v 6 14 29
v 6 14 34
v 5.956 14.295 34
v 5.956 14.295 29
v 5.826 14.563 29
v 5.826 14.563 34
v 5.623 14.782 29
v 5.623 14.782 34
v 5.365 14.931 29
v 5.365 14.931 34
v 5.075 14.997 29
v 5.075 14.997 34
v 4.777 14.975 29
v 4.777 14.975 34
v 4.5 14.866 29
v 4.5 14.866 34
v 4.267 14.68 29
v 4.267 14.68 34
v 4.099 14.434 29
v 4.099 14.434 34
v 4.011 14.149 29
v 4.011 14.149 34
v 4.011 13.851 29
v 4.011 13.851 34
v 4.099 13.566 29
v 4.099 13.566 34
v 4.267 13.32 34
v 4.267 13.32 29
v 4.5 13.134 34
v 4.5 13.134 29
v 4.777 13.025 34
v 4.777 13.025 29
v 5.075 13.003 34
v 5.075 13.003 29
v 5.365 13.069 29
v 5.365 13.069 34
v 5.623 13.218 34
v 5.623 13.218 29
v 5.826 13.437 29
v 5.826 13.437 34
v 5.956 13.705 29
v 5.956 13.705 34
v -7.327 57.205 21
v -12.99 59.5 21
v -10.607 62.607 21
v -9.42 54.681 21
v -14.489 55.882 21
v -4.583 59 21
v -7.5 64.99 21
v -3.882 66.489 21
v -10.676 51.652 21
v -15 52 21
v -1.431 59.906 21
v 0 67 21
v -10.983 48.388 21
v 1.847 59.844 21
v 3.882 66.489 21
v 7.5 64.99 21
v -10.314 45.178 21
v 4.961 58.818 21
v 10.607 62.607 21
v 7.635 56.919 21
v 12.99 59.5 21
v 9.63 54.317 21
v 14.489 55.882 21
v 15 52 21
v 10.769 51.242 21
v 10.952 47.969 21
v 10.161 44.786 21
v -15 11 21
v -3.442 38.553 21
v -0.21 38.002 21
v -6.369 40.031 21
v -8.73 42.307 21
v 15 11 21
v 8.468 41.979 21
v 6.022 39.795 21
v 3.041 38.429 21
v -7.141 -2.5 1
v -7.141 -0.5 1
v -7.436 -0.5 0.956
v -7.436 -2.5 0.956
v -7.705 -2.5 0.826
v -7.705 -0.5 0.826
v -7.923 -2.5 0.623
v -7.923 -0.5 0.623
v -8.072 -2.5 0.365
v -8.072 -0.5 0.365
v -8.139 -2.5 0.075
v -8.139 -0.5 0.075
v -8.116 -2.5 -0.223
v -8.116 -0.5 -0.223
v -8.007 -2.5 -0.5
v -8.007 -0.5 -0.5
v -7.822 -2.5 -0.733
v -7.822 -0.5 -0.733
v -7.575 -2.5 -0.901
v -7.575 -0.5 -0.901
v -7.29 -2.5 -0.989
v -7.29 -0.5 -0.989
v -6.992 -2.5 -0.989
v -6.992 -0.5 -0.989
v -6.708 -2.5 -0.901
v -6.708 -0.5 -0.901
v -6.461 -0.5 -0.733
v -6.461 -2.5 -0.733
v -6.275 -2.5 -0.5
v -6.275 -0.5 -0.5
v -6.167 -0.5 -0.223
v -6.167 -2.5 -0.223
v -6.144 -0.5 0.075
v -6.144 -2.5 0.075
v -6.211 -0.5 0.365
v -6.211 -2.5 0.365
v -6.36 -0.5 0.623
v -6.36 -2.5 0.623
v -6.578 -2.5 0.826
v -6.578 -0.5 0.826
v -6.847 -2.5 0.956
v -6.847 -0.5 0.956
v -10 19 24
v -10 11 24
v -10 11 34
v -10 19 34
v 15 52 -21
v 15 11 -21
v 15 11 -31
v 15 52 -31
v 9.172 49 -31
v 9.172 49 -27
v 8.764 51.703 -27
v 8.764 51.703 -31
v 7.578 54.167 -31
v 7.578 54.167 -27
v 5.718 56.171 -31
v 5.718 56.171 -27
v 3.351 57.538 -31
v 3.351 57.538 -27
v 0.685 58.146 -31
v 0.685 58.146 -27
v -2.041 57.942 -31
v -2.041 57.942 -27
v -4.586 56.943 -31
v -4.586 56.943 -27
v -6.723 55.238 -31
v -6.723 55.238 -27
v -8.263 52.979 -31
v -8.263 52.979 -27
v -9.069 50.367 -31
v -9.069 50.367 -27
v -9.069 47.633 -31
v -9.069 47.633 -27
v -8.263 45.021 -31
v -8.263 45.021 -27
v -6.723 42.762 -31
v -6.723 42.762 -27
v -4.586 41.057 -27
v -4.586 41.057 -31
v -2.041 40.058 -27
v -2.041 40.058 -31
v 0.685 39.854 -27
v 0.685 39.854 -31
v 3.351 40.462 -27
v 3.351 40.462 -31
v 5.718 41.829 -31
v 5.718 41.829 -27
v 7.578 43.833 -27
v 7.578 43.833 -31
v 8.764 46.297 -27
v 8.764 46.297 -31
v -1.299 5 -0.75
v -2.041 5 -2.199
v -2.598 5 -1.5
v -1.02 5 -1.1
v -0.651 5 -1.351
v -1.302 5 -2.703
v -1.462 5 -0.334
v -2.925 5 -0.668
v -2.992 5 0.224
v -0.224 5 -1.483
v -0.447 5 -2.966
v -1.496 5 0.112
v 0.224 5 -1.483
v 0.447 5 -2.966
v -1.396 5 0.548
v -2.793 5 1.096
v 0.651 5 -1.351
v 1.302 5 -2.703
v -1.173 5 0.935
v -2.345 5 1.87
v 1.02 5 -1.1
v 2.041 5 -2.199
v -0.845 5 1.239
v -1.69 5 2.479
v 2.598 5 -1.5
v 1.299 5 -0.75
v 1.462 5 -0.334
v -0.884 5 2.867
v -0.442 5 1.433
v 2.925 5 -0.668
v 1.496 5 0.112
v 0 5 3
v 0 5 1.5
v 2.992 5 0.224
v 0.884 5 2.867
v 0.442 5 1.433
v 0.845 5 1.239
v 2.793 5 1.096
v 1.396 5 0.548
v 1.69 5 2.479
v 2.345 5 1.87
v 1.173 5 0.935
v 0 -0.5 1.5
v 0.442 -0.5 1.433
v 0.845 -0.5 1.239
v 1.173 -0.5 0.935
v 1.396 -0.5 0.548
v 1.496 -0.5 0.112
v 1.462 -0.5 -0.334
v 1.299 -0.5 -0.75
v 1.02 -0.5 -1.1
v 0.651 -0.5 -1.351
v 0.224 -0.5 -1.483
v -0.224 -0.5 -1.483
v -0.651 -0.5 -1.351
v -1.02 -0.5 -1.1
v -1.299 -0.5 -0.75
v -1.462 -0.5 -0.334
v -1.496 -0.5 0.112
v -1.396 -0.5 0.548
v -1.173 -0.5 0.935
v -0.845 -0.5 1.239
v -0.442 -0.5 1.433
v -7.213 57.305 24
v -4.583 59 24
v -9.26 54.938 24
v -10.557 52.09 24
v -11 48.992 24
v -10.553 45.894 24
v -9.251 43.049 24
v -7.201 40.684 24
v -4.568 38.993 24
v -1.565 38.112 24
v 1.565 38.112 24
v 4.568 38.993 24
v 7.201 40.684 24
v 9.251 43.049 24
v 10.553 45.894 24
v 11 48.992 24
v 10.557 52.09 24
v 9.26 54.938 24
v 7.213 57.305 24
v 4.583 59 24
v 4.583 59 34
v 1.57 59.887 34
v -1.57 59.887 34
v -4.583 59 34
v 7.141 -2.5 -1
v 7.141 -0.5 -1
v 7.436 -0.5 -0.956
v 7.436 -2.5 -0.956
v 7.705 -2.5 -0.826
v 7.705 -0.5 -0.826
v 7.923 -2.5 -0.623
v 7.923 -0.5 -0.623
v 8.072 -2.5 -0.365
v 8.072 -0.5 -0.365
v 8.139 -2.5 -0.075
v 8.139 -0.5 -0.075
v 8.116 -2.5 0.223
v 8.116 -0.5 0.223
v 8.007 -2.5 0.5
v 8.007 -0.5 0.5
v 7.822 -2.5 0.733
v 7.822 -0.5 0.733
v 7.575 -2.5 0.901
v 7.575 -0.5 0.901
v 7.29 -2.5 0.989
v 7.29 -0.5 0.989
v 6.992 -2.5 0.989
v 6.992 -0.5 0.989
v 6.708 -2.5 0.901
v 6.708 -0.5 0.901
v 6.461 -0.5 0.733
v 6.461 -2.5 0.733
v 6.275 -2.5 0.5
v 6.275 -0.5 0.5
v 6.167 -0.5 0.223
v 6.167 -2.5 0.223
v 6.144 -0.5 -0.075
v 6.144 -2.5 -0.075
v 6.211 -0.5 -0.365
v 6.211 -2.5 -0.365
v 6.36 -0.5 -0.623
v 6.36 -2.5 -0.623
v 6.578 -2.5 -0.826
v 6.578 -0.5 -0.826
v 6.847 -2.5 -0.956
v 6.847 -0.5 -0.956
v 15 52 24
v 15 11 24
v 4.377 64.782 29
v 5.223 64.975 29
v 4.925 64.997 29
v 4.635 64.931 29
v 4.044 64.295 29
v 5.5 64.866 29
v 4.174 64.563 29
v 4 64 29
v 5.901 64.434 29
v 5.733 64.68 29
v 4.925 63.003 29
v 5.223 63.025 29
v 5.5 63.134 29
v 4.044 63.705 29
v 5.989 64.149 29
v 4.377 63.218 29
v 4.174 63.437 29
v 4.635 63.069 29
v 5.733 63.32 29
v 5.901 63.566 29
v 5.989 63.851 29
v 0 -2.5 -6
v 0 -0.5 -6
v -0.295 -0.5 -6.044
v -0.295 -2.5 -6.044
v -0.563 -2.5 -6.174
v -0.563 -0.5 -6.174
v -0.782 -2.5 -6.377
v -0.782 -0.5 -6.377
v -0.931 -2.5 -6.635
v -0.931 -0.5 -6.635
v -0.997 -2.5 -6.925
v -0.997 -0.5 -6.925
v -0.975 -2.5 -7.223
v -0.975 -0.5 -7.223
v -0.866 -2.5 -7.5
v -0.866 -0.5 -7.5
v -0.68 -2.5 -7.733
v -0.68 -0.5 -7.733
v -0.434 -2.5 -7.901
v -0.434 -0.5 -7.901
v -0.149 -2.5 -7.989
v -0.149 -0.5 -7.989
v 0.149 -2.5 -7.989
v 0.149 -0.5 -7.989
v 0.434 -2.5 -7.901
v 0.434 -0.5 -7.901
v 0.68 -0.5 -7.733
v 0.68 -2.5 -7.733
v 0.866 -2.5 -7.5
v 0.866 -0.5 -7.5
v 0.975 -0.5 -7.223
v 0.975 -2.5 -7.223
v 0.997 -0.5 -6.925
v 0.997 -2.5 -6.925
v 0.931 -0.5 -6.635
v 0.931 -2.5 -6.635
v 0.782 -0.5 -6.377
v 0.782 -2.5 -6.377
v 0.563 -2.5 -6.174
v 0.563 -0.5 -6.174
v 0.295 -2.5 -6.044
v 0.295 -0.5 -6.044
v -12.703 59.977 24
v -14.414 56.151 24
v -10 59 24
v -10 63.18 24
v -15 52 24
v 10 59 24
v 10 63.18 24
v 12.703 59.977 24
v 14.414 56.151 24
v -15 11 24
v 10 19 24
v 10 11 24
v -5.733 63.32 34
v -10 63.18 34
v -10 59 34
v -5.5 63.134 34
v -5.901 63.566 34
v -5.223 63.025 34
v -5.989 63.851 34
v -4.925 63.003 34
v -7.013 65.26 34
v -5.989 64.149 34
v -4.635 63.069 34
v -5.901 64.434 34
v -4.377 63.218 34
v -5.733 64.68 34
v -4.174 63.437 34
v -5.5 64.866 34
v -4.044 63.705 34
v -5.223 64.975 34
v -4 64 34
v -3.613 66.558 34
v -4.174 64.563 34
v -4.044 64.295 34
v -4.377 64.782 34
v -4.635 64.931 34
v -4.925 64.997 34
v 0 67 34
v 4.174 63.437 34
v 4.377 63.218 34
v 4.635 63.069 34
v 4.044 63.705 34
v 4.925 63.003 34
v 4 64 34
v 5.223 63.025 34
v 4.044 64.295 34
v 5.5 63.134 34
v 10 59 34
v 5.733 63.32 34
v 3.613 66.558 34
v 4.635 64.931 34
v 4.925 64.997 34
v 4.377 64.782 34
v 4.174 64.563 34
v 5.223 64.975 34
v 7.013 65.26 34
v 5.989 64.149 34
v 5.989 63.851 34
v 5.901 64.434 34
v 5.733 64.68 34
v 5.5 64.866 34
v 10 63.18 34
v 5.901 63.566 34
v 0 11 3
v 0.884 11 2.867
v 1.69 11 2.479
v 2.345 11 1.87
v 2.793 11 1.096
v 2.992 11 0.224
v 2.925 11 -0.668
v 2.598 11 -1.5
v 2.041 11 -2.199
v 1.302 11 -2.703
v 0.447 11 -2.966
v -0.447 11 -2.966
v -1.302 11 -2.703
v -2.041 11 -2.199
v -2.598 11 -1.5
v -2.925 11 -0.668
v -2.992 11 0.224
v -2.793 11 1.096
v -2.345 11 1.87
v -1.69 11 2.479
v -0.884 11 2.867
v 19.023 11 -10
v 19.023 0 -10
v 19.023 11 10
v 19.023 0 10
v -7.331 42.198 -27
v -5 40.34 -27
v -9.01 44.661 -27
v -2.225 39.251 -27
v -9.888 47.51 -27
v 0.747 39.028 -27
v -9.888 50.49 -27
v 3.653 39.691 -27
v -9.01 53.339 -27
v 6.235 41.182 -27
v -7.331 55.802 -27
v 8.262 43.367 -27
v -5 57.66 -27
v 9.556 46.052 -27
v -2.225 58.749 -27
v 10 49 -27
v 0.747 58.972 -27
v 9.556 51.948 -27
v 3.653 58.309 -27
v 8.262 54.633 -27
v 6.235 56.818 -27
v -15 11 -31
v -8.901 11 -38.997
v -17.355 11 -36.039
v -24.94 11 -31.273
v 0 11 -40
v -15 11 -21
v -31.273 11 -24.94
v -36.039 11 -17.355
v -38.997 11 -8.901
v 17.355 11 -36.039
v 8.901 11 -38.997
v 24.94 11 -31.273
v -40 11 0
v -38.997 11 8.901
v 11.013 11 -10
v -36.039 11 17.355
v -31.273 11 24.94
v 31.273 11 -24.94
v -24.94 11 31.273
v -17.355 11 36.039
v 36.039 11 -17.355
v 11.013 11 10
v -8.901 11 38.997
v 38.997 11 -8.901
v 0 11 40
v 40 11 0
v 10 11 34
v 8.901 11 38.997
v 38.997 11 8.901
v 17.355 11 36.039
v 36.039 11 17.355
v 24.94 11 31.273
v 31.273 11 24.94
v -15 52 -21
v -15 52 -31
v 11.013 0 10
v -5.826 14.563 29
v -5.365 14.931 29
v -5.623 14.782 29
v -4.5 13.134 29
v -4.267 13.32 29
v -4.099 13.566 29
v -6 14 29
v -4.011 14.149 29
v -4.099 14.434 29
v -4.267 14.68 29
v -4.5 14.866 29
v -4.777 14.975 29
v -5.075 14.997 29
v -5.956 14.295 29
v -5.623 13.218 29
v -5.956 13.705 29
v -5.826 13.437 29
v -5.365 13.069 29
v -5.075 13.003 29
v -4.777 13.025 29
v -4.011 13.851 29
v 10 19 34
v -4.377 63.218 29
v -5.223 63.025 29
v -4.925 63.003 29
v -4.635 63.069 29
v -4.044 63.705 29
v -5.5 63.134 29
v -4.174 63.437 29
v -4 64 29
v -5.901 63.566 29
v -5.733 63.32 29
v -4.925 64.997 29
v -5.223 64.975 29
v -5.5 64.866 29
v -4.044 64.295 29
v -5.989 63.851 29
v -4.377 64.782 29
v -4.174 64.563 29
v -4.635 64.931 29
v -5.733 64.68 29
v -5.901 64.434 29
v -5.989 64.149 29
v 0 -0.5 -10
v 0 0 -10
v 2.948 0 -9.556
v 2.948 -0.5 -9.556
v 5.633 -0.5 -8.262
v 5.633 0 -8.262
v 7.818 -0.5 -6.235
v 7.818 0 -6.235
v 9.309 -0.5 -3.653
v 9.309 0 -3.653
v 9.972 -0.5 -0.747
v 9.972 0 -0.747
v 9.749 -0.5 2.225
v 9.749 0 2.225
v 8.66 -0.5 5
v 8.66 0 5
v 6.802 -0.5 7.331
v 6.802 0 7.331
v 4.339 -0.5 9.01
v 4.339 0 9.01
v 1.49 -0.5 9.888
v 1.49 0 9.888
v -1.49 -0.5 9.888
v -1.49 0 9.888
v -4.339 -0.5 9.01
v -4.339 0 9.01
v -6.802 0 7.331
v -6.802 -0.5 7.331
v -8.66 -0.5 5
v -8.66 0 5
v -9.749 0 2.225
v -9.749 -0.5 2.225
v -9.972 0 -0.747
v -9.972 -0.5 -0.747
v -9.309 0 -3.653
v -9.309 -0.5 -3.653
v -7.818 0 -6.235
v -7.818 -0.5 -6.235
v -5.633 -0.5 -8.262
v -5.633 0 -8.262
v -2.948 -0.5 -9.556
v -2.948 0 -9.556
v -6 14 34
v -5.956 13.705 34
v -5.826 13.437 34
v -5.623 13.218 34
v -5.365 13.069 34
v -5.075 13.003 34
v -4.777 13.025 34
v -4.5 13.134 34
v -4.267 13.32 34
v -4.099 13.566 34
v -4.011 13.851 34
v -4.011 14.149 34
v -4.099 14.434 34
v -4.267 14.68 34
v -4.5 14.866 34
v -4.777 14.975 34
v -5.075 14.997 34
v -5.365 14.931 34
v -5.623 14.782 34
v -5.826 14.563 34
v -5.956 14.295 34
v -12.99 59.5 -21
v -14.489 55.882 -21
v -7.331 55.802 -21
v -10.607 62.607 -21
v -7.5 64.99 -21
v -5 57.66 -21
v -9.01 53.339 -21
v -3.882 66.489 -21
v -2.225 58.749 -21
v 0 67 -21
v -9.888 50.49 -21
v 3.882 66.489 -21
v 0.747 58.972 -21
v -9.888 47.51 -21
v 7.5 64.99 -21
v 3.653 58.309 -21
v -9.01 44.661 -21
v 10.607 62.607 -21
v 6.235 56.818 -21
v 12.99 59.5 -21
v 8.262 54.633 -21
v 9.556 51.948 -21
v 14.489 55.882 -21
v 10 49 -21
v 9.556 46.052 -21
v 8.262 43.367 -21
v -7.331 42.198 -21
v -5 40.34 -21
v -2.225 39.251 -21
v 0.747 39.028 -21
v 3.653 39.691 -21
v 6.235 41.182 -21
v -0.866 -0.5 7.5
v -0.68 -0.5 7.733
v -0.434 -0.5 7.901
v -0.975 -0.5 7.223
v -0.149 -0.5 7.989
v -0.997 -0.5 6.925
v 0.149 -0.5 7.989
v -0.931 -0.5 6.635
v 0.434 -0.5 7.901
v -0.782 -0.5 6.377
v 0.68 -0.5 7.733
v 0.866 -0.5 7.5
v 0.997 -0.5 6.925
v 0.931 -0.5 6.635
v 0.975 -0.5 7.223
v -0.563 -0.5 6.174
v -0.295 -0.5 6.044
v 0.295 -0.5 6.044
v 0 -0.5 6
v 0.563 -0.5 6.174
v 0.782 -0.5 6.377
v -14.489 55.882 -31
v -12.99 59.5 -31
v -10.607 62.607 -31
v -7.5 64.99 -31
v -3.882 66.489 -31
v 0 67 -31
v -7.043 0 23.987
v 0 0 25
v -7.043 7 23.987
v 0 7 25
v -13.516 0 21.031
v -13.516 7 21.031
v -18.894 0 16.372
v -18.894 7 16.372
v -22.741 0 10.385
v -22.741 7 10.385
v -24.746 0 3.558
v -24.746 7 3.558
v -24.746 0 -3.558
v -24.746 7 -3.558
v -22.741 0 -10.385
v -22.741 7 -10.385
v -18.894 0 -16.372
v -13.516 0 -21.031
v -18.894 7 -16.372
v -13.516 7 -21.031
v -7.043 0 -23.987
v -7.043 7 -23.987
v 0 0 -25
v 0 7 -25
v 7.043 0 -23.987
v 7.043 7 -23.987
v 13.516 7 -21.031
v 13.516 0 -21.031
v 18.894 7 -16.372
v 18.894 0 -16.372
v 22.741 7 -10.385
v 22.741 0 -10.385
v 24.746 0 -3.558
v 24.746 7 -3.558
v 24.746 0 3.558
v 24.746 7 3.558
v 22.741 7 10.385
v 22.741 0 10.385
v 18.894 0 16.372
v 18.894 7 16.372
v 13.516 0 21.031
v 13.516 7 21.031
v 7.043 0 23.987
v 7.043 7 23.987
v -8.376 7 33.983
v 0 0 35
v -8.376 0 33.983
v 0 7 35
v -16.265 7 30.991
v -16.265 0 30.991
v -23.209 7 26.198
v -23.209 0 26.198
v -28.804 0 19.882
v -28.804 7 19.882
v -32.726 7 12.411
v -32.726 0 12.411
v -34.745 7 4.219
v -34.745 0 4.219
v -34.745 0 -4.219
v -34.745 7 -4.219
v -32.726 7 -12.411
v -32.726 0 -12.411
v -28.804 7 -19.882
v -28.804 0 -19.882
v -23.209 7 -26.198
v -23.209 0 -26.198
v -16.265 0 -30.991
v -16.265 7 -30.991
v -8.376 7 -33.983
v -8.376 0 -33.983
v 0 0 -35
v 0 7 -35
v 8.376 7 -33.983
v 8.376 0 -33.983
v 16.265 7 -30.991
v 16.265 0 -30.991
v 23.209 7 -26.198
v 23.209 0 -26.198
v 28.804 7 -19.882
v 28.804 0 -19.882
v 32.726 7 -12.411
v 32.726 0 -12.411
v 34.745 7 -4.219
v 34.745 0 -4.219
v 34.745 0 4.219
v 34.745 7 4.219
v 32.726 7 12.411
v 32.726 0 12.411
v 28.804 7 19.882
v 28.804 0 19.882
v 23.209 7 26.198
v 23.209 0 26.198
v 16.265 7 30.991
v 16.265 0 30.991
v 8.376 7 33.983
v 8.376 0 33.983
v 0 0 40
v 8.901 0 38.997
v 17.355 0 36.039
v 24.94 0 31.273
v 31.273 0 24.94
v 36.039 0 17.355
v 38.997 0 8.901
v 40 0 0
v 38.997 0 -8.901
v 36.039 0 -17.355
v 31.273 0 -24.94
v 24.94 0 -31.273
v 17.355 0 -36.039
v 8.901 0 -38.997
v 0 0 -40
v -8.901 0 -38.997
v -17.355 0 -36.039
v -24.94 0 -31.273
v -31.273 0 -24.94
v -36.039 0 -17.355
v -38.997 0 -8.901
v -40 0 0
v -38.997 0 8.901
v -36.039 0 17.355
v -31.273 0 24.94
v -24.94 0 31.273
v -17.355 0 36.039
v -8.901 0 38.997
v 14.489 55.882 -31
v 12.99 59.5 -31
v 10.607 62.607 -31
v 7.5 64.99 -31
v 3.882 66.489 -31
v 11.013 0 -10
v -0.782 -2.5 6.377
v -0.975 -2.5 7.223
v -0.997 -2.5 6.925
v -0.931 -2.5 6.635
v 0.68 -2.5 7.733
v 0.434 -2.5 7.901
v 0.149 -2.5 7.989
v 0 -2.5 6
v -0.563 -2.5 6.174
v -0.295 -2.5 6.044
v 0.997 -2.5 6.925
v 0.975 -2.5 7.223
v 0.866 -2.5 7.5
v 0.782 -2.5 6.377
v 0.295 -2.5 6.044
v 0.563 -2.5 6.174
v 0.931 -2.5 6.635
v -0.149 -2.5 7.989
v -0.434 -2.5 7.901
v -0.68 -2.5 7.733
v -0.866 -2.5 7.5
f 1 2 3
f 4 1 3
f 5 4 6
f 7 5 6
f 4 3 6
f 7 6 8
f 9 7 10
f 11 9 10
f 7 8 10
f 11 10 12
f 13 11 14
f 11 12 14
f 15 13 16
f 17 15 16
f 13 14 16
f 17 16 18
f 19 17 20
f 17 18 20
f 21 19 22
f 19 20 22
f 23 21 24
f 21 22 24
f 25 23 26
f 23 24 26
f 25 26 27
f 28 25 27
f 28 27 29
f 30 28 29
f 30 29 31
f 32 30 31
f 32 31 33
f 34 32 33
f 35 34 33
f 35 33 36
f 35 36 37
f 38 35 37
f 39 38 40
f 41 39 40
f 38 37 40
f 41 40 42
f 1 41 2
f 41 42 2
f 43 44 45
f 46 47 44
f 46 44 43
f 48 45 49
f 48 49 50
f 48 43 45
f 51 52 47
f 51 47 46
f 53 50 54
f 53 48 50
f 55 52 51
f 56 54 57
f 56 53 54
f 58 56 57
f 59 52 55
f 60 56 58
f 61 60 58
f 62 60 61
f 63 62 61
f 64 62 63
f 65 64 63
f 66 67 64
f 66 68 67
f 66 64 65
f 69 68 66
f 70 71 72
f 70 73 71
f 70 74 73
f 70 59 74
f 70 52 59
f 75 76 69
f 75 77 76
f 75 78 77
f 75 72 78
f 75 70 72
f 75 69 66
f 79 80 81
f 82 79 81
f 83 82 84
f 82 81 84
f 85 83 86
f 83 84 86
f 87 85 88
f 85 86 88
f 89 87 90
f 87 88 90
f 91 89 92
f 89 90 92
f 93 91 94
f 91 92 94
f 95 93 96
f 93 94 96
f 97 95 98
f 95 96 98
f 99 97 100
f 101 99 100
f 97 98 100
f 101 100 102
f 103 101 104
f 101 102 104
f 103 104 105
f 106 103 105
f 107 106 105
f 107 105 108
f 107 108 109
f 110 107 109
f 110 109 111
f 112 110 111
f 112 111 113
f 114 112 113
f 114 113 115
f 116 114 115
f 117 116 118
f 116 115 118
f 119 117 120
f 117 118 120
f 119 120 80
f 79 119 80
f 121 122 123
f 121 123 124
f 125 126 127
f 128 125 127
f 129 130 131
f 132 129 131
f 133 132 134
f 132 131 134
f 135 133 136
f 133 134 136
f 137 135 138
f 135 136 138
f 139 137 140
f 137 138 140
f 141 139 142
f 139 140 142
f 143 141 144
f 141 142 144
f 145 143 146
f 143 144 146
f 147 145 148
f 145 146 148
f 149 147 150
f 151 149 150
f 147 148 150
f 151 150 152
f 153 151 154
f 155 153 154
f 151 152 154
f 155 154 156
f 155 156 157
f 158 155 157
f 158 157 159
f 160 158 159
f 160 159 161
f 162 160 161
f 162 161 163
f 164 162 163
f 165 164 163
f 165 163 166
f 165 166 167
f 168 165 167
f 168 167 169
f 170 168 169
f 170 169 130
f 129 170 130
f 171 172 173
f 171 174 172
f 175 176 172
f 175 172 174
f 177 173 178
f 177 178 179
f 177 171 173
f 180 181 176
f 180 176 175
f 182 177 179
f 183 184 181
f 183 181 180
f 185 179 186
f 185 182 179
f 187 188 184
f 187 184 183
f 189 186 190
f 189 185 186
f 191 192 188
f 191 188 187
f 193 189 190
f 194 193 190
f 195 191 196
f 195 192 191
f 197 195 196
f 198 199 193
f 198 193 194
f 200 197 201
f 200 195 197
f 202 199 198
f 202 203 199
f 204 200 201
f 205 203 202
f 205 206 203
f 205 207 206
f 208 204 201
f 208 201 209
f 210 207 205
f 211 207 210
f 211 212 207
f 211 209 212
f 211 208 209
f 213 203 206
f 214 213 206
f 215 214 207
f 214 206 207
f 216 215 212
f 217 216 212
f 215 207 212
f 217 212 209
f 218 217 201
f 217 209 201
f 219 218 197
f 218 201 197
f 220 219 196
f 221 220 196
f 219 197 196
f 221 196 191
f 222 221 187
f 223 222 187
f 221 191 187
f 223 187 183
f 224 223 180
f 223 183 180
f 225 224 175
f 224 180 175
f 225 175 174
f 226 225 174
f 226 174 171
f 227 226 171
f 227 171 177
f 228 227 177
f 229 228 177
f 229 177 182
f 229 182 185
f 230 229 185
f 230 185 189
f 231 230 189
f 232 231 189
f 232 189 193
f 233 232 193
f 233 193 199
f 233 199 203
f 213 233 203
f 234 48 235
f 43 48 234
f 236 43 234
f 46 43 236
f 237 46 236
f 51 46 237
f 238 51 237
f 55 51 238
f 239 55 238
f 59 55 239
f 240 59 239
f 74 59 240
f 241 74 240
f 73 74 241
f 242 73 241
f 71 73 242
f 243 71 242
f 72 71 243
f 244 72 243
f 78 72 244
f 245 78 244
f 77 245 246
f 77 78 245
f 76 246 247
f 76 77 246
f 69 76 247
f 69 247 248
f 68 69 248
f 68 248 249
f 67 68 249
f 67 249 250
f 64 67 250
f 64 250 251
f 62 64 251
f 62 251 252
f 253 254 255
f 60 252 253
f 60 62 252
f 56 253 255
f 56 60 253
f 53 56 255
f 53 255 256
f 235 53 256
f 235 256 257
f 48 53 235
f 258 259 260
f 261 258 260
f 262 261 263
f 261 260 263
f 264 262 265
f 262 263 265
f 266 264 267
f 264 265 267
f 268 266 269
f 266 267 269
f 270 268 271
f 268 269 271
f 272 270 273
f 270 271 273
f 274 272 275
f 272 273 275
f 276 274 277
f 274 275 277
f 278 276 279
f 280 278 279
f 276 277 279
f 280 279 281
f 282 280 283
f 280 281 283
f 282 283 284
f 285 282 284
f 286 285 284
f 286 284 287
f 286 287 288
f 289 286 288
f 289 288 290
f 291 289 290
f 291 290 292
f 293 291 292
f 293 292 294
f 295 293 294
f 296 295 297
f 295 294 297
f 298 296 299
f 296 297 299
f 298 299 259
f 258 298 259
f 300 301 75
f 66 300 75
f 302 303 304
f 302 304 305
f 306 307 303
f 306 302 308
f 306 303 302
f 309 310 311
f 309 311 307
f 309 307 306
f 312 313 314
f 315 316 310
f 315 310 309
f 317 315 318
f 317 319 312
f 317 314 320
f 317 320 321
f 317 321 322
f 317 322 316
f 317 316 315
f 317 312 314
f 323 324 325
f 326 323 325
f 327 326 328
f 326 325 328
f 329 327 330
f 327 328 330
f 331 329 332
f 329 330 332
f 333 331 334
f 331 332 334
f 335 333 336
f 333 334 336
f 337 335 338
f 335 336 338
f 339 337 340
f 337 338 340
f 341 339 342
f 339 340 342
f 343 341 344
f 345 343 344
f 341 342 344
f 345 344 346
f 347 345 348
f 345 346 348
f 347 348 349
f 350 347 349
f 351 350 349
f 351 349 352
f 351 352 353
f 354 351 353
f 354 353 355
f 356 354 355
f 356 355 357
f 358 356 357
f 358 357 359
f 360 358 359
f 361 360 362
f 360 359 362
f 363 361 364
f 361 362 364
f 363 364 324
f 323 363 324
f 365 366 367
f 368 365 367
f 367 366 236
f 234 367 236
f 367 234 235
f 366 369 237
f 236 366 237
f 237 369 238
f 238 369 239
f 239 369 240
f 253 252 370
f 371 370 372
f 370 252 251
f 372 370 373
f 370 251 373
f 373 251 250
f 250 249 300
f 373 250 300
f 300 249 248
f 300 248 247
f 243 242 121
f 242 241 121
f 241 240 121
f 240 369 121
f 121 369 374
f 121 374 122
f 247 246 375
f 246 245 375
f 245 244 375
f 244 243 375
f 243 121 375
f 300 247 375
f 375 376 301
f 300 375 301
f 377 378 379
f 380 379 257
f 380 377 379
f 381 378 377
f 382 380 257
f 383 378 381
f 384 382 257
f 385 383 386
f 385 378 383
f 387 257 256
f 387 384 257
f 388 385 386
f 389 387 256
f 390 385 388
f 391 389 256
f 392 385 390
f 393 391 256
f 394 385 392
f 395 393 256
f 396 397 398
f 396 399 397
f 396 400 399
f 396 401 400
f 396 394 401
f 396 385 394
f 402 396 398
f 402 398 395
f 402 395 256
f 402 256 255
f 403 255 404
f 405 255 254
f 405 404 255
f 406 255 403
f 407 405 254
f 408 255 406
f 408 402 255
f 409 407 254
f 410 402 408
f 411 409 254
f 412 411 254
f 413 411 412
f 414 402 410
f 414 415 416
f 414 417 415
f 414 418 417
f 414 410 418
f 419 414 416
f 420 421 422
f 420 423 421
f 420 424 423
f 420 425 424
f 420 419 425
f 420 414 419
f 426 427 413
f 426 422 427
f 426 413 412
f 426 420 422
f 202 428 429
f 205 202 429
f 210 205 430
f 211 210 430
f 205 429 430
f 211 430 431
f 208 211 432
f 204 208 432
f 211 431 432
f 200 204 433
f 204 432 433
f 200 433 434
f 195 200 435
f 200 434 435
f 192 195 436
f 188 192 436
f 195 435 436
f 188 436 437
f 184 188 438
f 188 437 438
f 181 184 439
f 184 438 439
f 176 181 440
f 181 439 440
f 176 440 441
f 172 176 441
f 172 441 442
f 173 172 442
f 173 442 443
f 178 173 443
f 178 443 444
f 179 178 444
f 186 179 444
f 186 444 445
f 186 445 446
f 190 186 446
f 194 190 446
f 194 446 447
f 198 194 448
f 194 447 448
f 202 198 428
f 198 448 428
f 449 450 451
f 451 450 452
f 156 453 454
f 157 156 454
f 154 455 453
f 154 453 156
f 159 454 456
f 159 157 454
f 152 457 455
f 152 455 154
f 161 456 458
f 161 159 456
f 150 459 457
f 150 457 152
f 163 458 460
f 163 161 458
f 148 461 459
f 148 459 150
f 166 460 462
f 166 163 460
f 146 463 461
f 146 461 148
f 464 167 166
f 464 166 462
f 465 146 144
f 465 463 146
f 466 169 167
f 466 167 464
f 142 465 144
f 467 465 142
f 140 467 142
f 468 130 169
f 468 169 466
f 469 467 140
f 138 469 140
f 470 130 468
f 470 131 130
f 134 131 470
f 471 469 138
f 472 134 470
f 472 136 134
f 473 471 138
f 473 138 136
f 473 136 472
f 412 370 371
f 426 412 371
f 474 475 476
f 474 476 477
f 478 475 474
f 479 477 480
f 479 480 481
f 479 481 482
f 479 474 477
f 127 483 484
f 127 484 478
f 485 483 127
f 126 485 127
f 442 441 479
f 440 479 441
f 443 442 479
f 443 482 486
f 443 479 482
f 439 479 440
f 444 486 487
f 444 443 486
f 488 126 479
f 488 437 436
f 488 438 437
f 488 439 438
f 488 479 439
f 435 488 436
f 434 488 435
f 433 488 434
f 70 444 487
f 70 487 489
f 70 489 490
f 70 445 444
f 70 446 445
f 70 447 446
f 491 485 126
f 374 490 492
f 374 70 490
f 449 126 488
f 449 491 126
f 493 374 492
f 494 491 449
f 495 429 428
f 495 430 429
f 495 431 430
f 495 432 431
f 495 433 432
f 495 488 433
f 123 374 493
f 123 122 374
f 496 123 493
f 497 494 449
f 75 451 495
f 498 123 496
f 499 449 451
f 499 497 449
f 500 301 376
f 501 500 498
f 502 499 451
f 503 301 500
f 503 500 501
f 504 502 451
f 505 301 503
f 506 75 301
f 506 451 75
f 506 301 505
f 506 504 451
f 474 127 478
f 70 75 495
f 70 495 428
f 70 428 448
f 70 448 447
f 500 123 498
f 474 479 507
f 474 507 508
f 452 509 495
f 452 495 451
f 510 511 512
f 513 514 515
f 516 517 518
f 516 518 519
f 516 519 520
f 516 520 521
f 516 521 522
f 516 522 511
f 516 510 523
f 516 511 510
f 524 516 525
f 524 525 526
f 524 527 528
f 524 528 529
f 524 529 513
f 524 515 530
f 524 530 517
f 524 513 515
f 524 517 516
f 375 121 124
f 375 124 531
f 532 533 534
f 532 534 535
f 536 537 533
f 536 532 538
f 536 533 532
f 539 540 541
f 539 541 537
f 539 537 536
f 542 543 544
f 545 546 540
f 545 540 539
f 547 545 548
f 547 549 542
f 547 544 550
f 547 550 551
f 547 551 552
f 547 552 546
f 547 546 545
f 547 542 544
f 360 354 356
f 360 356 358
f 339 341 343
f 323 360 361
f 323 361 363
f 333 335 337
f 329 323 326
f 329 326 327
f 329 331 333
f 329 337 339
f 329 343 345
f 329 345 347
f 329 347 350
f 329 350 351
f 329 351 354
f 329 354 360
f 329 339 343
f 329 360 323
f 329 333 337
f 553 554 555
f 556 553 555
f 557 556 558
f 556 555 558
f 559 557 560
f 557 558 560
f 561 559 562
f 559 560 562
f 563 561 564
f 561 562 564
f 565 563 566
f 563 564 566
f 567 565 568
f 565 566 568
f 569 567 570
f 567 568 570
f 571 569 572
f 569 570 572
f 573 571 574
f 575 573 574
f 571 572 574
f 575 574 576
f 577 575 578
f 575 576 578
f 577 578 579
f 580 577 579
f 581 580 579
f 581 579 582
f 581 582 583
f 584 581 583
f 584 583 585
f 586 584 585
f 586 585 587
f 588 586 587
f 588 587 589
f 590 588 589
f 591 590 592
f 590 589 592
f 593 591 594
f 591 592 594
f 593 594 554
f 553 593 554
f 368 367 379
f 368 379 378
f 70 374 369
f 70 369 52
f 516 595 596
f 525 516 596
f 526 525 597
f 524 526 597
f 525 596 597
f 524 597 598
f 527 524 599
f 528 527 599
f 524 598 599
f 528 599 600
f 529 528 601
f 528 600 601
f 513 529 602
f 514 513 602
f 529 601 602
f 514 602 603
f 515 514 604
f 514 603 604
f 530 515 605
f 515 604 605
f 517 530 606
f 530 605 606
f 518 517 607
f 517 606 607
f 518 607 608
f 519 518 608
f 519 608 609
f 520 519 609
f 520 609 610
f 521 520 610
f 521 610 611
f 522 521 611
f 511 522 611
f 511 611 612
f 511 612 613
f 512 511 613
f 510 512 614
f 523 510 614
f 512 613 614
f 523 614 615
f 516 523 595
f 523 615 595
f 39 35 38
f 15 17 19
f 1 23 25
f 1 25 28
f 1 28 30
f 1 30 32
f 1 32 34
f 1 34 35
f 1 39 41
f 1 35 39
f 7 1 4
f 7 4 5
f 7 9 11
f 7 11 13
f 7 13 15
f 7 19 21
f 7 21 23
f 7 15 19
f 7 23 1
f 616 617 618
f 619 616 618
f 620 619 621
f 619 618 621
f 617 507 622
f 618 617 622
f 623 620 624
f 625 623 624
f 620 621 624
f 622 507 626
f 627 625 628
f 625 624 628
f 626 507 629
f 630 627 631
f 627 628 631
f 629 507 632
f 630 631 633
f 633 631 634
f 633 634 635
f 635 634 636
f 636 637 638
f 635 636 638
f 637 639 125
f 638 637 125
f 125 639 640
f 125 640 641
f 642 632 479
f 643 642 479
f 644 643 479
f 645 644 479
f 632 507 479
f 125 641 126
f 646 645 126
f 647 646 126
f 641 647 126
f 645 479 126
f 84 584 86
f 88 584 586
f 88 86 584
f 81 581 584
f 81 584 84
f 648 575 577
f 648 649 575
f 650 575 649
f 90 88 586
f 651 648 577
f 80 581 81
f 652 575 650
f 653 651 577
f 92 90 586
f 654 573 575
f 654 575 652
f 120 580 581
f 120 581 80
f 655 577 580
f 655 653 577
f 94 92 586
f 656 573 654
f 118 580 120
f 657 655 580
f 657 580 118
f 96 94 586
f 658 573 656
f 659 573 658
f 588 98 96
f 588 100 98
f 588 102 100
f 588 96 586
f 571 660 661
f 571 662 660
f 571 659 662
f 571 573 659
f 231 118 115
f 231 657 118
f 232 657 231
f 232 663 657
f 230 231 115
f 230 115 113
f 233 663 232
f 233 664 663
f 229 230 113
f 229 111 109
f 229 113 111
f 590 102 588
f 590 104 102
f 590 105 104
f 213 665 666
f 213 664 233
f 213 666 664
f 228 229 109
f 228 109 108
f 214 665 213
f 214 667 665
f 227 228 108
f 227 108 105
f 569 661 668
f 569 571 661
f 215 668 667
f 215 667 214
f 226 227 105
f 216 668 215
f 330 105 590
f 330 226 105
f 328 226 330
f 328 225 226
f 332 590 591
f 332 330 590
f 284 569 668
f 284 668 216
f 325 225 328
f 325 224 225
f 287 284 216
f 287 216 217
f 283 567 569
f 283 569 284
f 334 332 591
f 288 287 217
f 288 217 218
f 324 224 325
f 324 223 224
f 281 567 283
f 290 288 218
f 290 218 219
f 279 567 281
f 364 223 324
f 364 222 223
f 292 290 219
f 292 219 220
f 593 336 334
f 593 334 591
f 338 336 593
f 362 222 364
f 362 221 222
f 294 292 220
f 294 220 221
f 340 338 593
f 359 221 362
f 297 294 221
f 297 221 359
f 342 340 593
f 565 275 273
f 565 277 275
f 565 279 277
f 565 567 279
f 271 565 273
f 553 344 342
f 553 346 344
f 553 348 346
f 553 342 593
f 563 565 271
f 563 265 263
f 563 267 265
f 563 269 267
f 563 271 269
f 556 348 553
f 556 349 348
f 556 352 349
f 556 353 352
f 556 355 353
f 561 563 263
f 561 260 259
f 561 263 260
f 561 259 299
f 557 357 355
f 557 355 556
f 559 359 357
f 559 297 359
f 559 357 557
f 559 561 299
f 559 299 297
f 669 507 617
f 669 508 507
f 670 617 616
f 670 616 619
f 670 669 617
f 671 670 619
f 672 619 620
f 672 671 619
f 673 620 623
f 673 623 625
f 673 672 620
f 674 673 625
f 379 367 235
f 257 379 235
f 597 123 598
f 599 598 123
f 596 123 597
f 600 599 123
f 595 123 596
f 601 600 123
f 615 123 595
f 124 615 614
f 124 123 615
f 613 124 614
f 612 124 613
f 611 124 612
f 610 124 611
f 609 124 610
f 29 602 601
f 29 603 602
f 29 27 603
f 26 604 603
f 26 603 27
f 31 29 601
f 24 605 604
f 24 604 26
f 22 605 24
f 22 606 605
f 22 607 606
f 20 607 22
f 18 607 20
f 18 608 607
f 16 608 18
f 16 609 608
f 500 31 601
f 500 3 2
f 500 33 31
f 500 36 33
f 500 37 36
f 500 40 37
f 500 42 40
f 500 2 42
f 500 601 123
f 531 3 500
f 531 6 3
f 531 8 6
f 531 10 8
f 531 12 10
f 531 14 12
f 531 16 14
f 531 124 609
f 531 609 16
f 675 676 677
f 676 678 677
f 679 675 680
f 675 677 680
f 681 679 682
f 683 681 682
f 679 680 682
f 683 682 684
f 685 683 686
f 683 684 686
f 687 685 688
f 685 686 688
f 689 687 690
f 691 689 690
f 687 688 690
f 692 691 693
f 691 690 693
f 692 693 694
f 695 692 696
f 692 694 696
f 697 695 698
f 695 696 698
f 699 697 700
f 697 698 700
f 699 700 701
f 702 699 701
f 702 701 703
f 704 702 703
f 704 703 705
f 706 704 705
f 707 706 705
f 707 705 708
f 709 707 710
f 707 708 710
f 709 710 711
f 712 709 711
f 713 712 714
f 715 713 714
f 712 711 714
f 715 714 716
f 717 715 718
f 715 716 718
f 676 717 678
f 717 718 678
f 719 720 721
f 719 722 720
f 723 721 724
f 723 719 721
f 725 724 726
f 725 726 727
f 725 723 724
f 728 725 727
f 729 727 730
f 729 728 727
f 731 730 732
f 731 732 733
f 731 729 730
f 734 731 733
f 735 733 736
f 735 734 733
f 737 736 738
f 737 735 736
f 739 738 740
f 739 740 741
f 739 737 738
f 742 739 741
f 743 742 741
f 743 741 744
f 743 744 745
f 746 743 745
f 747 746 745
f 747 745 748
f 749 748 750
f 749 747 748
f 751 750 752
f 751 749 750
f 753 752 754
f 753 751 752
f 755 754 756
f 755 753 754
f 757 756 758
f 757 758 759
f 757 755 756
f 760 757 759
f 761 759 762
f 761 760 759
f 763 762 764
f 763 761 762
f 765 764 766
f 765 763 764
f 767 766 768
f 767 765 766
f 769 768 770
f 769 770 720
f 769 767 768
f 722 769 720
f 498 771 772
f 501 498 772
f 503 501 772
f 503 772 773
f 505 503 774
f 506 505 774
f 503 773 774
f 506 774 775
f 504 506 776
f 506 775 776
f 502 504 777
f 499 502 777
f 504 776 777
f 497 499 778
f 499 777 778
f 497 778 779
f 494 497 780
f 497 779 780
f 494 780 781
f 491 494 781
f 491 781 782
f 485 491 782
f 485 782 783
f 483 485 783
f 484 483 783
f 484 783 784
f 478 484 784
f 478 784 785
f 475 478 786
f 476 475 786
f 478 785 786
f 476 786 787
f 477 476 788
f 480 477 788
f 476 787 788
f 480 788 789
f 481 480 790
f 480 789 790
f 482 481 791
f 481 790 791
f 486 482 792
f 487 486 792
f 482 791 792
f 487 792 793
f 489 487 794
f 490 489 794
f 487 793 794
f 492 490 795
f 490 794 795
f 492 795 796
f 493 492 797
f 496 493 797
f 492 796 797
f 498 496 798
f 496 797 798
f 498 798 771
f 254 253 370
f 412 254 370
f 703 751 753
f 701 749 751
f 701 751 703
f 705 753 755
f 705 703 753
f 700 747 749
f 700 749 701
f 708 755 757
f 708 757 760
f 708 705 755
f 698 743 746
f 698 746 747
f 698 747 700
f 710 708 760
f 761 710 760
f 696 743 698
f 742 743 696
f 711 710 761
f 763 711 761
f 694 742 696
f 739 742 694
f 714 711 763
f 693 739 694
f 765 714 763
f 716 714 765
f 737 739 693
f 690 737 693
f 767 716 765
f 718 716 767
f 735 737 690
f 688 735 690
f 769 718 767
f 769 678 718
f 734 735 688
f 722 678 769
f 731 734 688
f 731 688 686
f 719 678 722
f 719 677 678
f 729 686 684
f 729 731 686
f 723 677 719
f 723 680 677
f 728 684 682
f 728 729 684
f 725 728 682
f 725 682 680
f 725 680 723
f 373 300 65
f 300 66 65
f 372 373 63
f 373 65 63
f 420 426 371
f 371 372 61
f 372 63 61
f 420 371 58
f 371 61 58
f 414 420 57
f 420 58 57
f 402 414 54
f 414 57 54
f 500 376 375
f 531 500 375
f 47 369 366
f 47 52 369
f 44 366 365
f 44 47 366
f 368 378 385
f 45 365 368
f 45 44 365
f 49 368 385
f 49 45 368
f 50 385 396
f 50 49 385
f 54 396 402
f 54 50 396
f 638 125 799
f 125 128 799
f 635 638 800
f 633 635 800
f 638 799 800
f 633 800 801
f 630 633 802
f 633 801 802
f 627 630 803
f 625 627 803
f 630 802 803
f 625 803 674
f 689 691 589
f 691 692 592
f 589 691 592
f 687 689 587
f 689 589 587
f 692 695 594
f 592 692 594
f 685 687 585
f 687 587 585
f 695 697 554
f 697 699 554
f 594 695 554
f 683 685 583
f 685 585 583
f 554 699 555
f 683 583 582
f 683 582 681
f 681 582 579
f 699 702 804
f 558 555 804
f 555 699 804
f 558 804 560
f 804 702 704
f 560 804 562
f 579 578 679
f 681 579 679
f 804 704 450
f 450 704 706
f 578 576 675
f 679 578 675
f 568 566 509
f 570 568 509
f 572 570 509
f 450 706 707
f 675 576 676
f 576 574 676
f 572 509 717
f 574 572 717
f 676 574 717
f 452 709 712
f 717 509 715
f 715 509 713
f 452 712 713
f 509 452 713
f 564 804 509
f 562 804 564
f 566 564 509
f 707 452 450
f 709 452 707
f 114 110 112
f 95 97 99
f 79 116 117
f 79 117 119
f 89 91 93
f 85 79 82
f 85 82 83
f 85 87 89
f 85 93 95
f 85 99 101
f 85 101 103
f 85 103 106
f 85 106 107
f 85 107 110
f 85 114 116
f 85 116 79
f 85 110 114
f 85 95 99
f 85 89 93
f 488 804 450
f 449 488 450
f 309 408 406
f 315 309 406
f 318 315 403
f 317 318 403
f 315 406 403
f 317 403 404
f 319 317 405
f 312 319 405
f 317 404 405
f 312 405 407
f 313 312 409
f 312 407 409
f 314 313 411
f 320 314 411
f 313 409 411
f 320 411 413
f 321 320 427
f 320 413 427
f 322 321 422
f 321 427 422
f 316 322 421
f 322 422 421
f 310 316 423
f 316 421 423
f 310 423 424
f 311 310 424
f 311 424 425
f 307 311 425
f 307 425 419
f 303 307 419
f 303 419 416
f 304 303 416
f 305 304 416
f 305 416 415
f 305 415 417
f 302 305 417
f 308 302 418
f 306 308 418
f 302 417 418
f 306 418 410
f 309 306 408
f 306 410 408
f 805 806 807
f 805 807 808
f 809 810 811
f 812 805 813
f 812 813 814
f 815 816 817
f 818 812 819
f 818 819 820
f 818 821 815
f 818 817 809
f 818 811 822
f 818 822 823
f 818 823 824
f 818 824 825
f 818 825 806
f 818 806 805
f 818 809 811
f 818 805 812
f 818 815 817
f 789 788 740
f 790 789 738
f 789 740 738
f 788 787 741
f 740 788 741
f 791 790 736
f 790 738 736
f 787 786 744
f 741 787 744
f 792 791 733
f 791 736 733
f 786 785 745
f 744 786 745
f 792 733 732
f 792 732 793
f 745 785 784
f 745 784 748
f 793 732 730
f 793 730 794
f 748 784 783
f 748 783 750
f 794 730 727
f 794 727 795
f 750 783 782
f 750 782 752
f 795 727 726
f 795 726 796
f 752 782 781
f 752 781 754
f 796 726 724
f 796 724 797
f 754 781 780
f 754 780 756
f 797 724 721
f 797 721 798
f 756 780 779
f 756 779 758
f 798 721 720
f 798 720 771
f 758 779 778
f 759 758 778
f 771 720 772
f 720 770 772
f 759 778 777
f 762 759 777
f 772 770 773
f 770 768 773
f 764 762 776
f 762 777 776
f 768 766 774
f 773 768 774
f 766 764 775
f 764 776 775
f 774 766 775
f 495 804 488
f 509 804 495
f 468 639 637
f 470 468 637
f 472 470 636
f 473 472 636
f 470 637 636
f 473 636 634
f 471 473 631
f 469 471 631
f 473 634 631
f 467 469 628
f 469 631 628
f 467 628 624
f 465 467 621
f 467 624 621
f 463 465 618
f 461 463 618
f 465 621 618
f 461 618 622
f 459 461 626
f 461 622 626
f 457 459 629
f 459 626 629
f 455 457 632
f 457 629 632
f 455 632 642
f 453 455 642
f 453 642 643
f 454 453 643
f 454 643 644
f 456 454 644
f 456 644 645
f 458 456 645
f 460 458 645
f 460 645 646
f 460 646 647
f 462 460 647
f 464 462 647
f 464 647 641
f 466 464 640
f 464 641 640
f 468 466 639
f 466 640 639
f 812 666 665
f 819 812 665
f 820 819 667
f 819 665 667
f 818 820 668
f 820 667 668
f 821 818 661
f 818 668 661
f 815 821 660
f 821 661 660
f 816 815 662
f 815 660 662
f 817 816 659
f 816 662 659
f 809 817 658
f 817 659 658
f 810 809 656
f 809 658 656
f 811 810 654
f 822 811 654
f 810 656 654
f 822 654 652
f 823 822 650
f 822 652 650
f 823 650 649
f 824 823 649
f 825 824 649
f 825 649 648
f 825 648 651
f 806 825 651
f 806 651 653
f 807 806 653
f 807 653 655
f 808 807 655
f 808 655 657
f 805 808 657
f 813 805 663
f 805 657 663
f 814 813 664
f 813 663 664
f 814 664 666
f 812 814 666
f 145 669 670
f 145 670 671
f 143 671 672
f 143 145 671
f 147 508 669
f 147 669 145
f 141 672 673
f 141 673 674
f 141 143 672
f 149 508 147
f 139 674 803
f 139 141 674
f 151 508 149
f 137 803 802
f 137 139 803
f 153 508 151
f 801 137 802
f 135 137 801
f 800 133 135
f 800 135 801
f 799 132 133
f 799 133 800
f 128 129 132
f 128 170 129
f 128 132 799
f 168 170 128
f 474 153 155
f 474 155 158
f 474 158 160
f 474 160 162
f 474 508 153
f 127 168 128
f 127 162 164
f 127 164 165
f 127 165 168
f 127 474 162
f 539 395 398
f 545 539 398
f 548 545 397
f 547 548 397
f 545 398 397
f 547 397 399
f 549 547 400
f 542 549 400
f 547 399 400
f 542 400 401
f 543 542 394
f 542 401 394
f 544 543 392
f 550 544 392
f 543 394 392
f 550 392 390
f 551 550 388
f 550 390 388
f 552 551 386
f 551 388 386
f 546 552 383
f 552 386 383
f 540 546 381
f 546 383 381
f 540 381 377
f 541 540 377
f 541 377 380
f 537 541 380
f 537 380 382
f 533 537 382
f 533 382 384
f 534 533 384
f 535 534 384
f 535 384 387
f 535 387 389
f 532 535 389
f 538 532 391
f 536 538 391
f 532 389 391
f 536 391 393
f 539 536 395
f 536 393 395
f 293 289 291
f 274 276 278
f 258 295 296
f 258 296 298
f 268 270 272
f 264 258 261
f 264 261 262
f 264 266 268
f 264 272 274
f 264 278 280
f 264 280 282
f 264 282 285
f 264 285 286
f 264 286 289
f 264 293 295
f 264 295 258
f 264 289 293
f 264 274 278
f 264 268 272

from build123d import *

# Parameters (mm, degrees)
SKETCH1_R               = 40
BOSS_EXTRUDE1_DEPTH     = 11
SKETCH3_W               = 10
SKETCH3_H               = 7
SKETCH5_R               = 3
CUT_EXTRUDE2_DEPTH      = 6
SKETCH6_W               = 30
SKETCH6_H               = 3
BOSS_EXTRUDE2_DEPTH     = 56
SKETCH7_W               = 20
SKETCH7_H               = 8
BOSS_EXTRUDE3_DEPTH     = 10
CUT_EXTRUDE4_DEPTH      = 101.920760996
CUT_EXTRUDE4_DEPTH_BACK = 5
SKETCH9_R               = 11
FILLET2_R               = 15
SKETCH13_R              = 10
BOSS_EXTRUDE4_DEPTH     = 0.5
SKETCH14_R              = 1
BOSS_EXTRUDE5_DEPTH     = 2
SKETCH4_R               = 1.5
CUT_EXTRUDE1_DEPTH      = 80.598994969
SKETCH15_W              = 30
SKETCH15_H              = 10
BOSS_EXTRUDE6_DEPTH     = 56
FILLET3_R               = 15
SKETCH16_R              = 1
CUT_EXTRUDE5_DEPTH      = 5
SKETCH20_R              = 10
CUT_EXTRUDE8_DEPTH      = 6
SKETCH22_R              = 9.171602893
CUT_EXTRUDE9_DEPTH      = 6
SKETCH23_W              = 8.009683582
SKETCH23_H              = 20
CUT_EXTRUDE10_DEPTH     = 14


with BuildPart() as part:
    # Sketch1 → Boss-Extrude1 (new body)
    with BuildSketch(Plane(origin=(0, 0, 0), x_dir=(1, 0, 0), z_dir=(0, 1, 0))):
        with Locations(Location((0, 0, 0), (0, 0, 270))):
            Circle(SKETCH1_R)
    extrude(amount=BOSS_EXTRUDE1_DEPTH)

    # Sketch3 → Cut-Revolve1 (revolve, cut)
    with BuildSketch(Plane.XY, mode=Mode.PRIVATE) as cut_revolve1_sk:
        with Locations((-30, 3.5)):
            Rectangle(SKETCH3_W, SKETCH3_H)
    revolve(cut_revolve1_sk.sketch.rotate(Axis((0, 17.41193703, 0), (0, -1, 0)), 270), axis=Axis((0, 17.41193703, 0), (0, -1, 0)), mode=Mode.SUBTRACT)

    # Sketch5 → Cut-Extrude2 (cut)
    with BuildSketch(Plane(origin=(0, 11, 0), x_dir=(1, 0, 0), z_dir=(0, 1, 0))):
        with Locations(Location((0, 0, 0), (0, 0, 270))):
            Circle(SKETCH5_R)
    extrude(amount=-CUT_EXTRUDE2_DEPTH, mode=Mode.SUBTRACT)

    # Sketch6 → Boss-Extrude2 (add)
    with BuildSketch(Plane(origin=(0, 11, 0), x_dir=(1, 0, 0), z_dir=(0, 1, 0))):
        with Locations((0, -22.5)):
            Rectangle(SKETCH6_W, SKETCH6_H)
    extrude(amount=BOSS_EXTRUDE2_DEPTH)

    # Sketch7 → Boss-Extrude3 (add)
    with BuildSketch(Plane.XY.offset(24)):
        with Locations((0, 15)):
            Rectangle(SKETCH7_W, SKETCH7_H)
        with Locations((0, 63)):
            Rectangle(SKETCH7_W, SKETCH7_H)
    extrude(amount=BOSS_EXTRUDE3_DEPTH)

    # Sketch9 → Cut-Extrude4 (cut, two sides: drawn at the far end of the back side and taken through both)
    with BuildSketch(Plane.XY.offset(24).offset(-CUT_EXTRUDE4_DEPTH_BACK)):
        with Locations(Location((0, 49, 0), (0, 0, 114.619977329))):
            Circle(SKETCH9_R)
    extrude(amount=CUT_EXTRUDE4_DEPTH + CUT_EXTRUDE4_DEPTH_BACK, mode=Mode.SUBTRACT)

    # Fillet2
    fillet2_edges = [part.edges().sort_by_distance(p)[0] for p in [
        (15, 67, 22.5),
        (-15, 67, 22.5),
    ]]
    fillet(fillet2_edges, radius=FILLET2_R - 0.0001)  # a hair under: the kernel refuses the full size

    # Sketch13 → Boss-Extrude4 (add)
    with BuildSketch(Plane.XZ):
        with Locations(Location((0, 0, 0), (0, 0, 270))):
            Circle(SKETCH13_R)
    extrude(amount=BOSS_EXTRUDE4_DEPTH)

    # Sketch14 → Boss-Extrude5 (add)
    with BuildSketch(Plane.XZ.offset(0.5)):
        with Locations(Location((0, 7, 0), (0, 0, 270))):
            Circle(SKETCH14_R)
        with Locations(Location((0, -7, 0), (0, 0, 90))):
            Circle(SKETCH14_R)
        with Locations(Location((7.141428429, 0, 0), (0, 0, 270))):
            Circle(SKETCH14_R)
        with Locations(Location((-7.141428429, 0, 0), (0, 0, 90))):
            Circle(SKETCH14_R)
    extrude(amount=BOSS_EXTRUDE5_DEPTH)

    # Sketch4 → Cut-Extrude1 (cut, through all)
    with BuildSketch(Plane(origin=(0, 11, 0), x_dir=(1, 0, 0), z_dir=(0, 1, 0))):
        with Locations(Location((0, 0, 0), (0, 0, 270))):
            Circle(SKETCH4_R)
    extrude(amount=-CUT_EXTRUDE1_DEPTH, mode=Mode.SUBTRACT)

    # Sketch15 → Boss-Extrude6 (add)
    with BuildSketch(Plane(origin=(0, 11, 0), x_dir=(1, 0, 0), z_dir=(0, 1, 0))):
        with Locations((0, 26)):
            Rectangle(SKETCH15_W, SKETCH15_H)
    extrude(amount=BOSS_EXTRUDE6_DEPTH)

    # Fillet3
    fillet3_edges = [part.edges().sort_by_distance(p)[0] for p in [
        (-15, 67, -26),
        (15, 67, -26),
    ]]
    fillet(fillet3_edges, radius=FILLET3_R - 0.0001)  # a hair under: the kernel refuses the full size

    # Sketch16 → Cut-Extrude5 (cut)
    with BuildSketch(Plane.XY.offset(34)):
        with Locations((-5, 64)):
            Circle(SKETCH16_R)
        with Locations(Location((5, 64, 0), (0, 0, 180))):
            Circle(SKETCH16_R)
        with Locations(Location((-5, 14, 0), (0, 0, 180))):
            Circle(SKETCH16_R)
        with Locations((5, 14)):
            Circle(SKETCH16_R)
    extrude(amount=-CUT_EXTRUDE5_DEPTH, mode=Mode.SUBTRACT)

    # Sketch20 → Cut-Extrude8 (cut)
    with BuildSketch(Plane.XY.offset(-21)):
        with Locations((0, 49)):
            Circle(SKETCH20_R)
    extrude(amount=-CUT_EXTRUDE8_DEPTH, mode=Mode.SUBTRACT)

    # Sketch22 → Cut-Extrude9 (cut)
    with BuildSketch(Plane.XY.offset(-27)):
        with Locations((0, 49)):
            Circle(SKETCH22_R)
    extrude(amount=-CUT_EXTRUDE9_DEPTH, mode=Mode.SUBTRACT)

    # Sketch23 → Cut-Extrude10 (cut)
    with BuildSketch(Plane.XZ):
        with Locations((15.018156717, 0)):
            Rectangle(SKETCH23_W, SKETCH23_H)
    extrude(amount=-CUT_EXTRUDE10_DEPTH, mode=Mode.SUBTRACT)


solid = part.part
